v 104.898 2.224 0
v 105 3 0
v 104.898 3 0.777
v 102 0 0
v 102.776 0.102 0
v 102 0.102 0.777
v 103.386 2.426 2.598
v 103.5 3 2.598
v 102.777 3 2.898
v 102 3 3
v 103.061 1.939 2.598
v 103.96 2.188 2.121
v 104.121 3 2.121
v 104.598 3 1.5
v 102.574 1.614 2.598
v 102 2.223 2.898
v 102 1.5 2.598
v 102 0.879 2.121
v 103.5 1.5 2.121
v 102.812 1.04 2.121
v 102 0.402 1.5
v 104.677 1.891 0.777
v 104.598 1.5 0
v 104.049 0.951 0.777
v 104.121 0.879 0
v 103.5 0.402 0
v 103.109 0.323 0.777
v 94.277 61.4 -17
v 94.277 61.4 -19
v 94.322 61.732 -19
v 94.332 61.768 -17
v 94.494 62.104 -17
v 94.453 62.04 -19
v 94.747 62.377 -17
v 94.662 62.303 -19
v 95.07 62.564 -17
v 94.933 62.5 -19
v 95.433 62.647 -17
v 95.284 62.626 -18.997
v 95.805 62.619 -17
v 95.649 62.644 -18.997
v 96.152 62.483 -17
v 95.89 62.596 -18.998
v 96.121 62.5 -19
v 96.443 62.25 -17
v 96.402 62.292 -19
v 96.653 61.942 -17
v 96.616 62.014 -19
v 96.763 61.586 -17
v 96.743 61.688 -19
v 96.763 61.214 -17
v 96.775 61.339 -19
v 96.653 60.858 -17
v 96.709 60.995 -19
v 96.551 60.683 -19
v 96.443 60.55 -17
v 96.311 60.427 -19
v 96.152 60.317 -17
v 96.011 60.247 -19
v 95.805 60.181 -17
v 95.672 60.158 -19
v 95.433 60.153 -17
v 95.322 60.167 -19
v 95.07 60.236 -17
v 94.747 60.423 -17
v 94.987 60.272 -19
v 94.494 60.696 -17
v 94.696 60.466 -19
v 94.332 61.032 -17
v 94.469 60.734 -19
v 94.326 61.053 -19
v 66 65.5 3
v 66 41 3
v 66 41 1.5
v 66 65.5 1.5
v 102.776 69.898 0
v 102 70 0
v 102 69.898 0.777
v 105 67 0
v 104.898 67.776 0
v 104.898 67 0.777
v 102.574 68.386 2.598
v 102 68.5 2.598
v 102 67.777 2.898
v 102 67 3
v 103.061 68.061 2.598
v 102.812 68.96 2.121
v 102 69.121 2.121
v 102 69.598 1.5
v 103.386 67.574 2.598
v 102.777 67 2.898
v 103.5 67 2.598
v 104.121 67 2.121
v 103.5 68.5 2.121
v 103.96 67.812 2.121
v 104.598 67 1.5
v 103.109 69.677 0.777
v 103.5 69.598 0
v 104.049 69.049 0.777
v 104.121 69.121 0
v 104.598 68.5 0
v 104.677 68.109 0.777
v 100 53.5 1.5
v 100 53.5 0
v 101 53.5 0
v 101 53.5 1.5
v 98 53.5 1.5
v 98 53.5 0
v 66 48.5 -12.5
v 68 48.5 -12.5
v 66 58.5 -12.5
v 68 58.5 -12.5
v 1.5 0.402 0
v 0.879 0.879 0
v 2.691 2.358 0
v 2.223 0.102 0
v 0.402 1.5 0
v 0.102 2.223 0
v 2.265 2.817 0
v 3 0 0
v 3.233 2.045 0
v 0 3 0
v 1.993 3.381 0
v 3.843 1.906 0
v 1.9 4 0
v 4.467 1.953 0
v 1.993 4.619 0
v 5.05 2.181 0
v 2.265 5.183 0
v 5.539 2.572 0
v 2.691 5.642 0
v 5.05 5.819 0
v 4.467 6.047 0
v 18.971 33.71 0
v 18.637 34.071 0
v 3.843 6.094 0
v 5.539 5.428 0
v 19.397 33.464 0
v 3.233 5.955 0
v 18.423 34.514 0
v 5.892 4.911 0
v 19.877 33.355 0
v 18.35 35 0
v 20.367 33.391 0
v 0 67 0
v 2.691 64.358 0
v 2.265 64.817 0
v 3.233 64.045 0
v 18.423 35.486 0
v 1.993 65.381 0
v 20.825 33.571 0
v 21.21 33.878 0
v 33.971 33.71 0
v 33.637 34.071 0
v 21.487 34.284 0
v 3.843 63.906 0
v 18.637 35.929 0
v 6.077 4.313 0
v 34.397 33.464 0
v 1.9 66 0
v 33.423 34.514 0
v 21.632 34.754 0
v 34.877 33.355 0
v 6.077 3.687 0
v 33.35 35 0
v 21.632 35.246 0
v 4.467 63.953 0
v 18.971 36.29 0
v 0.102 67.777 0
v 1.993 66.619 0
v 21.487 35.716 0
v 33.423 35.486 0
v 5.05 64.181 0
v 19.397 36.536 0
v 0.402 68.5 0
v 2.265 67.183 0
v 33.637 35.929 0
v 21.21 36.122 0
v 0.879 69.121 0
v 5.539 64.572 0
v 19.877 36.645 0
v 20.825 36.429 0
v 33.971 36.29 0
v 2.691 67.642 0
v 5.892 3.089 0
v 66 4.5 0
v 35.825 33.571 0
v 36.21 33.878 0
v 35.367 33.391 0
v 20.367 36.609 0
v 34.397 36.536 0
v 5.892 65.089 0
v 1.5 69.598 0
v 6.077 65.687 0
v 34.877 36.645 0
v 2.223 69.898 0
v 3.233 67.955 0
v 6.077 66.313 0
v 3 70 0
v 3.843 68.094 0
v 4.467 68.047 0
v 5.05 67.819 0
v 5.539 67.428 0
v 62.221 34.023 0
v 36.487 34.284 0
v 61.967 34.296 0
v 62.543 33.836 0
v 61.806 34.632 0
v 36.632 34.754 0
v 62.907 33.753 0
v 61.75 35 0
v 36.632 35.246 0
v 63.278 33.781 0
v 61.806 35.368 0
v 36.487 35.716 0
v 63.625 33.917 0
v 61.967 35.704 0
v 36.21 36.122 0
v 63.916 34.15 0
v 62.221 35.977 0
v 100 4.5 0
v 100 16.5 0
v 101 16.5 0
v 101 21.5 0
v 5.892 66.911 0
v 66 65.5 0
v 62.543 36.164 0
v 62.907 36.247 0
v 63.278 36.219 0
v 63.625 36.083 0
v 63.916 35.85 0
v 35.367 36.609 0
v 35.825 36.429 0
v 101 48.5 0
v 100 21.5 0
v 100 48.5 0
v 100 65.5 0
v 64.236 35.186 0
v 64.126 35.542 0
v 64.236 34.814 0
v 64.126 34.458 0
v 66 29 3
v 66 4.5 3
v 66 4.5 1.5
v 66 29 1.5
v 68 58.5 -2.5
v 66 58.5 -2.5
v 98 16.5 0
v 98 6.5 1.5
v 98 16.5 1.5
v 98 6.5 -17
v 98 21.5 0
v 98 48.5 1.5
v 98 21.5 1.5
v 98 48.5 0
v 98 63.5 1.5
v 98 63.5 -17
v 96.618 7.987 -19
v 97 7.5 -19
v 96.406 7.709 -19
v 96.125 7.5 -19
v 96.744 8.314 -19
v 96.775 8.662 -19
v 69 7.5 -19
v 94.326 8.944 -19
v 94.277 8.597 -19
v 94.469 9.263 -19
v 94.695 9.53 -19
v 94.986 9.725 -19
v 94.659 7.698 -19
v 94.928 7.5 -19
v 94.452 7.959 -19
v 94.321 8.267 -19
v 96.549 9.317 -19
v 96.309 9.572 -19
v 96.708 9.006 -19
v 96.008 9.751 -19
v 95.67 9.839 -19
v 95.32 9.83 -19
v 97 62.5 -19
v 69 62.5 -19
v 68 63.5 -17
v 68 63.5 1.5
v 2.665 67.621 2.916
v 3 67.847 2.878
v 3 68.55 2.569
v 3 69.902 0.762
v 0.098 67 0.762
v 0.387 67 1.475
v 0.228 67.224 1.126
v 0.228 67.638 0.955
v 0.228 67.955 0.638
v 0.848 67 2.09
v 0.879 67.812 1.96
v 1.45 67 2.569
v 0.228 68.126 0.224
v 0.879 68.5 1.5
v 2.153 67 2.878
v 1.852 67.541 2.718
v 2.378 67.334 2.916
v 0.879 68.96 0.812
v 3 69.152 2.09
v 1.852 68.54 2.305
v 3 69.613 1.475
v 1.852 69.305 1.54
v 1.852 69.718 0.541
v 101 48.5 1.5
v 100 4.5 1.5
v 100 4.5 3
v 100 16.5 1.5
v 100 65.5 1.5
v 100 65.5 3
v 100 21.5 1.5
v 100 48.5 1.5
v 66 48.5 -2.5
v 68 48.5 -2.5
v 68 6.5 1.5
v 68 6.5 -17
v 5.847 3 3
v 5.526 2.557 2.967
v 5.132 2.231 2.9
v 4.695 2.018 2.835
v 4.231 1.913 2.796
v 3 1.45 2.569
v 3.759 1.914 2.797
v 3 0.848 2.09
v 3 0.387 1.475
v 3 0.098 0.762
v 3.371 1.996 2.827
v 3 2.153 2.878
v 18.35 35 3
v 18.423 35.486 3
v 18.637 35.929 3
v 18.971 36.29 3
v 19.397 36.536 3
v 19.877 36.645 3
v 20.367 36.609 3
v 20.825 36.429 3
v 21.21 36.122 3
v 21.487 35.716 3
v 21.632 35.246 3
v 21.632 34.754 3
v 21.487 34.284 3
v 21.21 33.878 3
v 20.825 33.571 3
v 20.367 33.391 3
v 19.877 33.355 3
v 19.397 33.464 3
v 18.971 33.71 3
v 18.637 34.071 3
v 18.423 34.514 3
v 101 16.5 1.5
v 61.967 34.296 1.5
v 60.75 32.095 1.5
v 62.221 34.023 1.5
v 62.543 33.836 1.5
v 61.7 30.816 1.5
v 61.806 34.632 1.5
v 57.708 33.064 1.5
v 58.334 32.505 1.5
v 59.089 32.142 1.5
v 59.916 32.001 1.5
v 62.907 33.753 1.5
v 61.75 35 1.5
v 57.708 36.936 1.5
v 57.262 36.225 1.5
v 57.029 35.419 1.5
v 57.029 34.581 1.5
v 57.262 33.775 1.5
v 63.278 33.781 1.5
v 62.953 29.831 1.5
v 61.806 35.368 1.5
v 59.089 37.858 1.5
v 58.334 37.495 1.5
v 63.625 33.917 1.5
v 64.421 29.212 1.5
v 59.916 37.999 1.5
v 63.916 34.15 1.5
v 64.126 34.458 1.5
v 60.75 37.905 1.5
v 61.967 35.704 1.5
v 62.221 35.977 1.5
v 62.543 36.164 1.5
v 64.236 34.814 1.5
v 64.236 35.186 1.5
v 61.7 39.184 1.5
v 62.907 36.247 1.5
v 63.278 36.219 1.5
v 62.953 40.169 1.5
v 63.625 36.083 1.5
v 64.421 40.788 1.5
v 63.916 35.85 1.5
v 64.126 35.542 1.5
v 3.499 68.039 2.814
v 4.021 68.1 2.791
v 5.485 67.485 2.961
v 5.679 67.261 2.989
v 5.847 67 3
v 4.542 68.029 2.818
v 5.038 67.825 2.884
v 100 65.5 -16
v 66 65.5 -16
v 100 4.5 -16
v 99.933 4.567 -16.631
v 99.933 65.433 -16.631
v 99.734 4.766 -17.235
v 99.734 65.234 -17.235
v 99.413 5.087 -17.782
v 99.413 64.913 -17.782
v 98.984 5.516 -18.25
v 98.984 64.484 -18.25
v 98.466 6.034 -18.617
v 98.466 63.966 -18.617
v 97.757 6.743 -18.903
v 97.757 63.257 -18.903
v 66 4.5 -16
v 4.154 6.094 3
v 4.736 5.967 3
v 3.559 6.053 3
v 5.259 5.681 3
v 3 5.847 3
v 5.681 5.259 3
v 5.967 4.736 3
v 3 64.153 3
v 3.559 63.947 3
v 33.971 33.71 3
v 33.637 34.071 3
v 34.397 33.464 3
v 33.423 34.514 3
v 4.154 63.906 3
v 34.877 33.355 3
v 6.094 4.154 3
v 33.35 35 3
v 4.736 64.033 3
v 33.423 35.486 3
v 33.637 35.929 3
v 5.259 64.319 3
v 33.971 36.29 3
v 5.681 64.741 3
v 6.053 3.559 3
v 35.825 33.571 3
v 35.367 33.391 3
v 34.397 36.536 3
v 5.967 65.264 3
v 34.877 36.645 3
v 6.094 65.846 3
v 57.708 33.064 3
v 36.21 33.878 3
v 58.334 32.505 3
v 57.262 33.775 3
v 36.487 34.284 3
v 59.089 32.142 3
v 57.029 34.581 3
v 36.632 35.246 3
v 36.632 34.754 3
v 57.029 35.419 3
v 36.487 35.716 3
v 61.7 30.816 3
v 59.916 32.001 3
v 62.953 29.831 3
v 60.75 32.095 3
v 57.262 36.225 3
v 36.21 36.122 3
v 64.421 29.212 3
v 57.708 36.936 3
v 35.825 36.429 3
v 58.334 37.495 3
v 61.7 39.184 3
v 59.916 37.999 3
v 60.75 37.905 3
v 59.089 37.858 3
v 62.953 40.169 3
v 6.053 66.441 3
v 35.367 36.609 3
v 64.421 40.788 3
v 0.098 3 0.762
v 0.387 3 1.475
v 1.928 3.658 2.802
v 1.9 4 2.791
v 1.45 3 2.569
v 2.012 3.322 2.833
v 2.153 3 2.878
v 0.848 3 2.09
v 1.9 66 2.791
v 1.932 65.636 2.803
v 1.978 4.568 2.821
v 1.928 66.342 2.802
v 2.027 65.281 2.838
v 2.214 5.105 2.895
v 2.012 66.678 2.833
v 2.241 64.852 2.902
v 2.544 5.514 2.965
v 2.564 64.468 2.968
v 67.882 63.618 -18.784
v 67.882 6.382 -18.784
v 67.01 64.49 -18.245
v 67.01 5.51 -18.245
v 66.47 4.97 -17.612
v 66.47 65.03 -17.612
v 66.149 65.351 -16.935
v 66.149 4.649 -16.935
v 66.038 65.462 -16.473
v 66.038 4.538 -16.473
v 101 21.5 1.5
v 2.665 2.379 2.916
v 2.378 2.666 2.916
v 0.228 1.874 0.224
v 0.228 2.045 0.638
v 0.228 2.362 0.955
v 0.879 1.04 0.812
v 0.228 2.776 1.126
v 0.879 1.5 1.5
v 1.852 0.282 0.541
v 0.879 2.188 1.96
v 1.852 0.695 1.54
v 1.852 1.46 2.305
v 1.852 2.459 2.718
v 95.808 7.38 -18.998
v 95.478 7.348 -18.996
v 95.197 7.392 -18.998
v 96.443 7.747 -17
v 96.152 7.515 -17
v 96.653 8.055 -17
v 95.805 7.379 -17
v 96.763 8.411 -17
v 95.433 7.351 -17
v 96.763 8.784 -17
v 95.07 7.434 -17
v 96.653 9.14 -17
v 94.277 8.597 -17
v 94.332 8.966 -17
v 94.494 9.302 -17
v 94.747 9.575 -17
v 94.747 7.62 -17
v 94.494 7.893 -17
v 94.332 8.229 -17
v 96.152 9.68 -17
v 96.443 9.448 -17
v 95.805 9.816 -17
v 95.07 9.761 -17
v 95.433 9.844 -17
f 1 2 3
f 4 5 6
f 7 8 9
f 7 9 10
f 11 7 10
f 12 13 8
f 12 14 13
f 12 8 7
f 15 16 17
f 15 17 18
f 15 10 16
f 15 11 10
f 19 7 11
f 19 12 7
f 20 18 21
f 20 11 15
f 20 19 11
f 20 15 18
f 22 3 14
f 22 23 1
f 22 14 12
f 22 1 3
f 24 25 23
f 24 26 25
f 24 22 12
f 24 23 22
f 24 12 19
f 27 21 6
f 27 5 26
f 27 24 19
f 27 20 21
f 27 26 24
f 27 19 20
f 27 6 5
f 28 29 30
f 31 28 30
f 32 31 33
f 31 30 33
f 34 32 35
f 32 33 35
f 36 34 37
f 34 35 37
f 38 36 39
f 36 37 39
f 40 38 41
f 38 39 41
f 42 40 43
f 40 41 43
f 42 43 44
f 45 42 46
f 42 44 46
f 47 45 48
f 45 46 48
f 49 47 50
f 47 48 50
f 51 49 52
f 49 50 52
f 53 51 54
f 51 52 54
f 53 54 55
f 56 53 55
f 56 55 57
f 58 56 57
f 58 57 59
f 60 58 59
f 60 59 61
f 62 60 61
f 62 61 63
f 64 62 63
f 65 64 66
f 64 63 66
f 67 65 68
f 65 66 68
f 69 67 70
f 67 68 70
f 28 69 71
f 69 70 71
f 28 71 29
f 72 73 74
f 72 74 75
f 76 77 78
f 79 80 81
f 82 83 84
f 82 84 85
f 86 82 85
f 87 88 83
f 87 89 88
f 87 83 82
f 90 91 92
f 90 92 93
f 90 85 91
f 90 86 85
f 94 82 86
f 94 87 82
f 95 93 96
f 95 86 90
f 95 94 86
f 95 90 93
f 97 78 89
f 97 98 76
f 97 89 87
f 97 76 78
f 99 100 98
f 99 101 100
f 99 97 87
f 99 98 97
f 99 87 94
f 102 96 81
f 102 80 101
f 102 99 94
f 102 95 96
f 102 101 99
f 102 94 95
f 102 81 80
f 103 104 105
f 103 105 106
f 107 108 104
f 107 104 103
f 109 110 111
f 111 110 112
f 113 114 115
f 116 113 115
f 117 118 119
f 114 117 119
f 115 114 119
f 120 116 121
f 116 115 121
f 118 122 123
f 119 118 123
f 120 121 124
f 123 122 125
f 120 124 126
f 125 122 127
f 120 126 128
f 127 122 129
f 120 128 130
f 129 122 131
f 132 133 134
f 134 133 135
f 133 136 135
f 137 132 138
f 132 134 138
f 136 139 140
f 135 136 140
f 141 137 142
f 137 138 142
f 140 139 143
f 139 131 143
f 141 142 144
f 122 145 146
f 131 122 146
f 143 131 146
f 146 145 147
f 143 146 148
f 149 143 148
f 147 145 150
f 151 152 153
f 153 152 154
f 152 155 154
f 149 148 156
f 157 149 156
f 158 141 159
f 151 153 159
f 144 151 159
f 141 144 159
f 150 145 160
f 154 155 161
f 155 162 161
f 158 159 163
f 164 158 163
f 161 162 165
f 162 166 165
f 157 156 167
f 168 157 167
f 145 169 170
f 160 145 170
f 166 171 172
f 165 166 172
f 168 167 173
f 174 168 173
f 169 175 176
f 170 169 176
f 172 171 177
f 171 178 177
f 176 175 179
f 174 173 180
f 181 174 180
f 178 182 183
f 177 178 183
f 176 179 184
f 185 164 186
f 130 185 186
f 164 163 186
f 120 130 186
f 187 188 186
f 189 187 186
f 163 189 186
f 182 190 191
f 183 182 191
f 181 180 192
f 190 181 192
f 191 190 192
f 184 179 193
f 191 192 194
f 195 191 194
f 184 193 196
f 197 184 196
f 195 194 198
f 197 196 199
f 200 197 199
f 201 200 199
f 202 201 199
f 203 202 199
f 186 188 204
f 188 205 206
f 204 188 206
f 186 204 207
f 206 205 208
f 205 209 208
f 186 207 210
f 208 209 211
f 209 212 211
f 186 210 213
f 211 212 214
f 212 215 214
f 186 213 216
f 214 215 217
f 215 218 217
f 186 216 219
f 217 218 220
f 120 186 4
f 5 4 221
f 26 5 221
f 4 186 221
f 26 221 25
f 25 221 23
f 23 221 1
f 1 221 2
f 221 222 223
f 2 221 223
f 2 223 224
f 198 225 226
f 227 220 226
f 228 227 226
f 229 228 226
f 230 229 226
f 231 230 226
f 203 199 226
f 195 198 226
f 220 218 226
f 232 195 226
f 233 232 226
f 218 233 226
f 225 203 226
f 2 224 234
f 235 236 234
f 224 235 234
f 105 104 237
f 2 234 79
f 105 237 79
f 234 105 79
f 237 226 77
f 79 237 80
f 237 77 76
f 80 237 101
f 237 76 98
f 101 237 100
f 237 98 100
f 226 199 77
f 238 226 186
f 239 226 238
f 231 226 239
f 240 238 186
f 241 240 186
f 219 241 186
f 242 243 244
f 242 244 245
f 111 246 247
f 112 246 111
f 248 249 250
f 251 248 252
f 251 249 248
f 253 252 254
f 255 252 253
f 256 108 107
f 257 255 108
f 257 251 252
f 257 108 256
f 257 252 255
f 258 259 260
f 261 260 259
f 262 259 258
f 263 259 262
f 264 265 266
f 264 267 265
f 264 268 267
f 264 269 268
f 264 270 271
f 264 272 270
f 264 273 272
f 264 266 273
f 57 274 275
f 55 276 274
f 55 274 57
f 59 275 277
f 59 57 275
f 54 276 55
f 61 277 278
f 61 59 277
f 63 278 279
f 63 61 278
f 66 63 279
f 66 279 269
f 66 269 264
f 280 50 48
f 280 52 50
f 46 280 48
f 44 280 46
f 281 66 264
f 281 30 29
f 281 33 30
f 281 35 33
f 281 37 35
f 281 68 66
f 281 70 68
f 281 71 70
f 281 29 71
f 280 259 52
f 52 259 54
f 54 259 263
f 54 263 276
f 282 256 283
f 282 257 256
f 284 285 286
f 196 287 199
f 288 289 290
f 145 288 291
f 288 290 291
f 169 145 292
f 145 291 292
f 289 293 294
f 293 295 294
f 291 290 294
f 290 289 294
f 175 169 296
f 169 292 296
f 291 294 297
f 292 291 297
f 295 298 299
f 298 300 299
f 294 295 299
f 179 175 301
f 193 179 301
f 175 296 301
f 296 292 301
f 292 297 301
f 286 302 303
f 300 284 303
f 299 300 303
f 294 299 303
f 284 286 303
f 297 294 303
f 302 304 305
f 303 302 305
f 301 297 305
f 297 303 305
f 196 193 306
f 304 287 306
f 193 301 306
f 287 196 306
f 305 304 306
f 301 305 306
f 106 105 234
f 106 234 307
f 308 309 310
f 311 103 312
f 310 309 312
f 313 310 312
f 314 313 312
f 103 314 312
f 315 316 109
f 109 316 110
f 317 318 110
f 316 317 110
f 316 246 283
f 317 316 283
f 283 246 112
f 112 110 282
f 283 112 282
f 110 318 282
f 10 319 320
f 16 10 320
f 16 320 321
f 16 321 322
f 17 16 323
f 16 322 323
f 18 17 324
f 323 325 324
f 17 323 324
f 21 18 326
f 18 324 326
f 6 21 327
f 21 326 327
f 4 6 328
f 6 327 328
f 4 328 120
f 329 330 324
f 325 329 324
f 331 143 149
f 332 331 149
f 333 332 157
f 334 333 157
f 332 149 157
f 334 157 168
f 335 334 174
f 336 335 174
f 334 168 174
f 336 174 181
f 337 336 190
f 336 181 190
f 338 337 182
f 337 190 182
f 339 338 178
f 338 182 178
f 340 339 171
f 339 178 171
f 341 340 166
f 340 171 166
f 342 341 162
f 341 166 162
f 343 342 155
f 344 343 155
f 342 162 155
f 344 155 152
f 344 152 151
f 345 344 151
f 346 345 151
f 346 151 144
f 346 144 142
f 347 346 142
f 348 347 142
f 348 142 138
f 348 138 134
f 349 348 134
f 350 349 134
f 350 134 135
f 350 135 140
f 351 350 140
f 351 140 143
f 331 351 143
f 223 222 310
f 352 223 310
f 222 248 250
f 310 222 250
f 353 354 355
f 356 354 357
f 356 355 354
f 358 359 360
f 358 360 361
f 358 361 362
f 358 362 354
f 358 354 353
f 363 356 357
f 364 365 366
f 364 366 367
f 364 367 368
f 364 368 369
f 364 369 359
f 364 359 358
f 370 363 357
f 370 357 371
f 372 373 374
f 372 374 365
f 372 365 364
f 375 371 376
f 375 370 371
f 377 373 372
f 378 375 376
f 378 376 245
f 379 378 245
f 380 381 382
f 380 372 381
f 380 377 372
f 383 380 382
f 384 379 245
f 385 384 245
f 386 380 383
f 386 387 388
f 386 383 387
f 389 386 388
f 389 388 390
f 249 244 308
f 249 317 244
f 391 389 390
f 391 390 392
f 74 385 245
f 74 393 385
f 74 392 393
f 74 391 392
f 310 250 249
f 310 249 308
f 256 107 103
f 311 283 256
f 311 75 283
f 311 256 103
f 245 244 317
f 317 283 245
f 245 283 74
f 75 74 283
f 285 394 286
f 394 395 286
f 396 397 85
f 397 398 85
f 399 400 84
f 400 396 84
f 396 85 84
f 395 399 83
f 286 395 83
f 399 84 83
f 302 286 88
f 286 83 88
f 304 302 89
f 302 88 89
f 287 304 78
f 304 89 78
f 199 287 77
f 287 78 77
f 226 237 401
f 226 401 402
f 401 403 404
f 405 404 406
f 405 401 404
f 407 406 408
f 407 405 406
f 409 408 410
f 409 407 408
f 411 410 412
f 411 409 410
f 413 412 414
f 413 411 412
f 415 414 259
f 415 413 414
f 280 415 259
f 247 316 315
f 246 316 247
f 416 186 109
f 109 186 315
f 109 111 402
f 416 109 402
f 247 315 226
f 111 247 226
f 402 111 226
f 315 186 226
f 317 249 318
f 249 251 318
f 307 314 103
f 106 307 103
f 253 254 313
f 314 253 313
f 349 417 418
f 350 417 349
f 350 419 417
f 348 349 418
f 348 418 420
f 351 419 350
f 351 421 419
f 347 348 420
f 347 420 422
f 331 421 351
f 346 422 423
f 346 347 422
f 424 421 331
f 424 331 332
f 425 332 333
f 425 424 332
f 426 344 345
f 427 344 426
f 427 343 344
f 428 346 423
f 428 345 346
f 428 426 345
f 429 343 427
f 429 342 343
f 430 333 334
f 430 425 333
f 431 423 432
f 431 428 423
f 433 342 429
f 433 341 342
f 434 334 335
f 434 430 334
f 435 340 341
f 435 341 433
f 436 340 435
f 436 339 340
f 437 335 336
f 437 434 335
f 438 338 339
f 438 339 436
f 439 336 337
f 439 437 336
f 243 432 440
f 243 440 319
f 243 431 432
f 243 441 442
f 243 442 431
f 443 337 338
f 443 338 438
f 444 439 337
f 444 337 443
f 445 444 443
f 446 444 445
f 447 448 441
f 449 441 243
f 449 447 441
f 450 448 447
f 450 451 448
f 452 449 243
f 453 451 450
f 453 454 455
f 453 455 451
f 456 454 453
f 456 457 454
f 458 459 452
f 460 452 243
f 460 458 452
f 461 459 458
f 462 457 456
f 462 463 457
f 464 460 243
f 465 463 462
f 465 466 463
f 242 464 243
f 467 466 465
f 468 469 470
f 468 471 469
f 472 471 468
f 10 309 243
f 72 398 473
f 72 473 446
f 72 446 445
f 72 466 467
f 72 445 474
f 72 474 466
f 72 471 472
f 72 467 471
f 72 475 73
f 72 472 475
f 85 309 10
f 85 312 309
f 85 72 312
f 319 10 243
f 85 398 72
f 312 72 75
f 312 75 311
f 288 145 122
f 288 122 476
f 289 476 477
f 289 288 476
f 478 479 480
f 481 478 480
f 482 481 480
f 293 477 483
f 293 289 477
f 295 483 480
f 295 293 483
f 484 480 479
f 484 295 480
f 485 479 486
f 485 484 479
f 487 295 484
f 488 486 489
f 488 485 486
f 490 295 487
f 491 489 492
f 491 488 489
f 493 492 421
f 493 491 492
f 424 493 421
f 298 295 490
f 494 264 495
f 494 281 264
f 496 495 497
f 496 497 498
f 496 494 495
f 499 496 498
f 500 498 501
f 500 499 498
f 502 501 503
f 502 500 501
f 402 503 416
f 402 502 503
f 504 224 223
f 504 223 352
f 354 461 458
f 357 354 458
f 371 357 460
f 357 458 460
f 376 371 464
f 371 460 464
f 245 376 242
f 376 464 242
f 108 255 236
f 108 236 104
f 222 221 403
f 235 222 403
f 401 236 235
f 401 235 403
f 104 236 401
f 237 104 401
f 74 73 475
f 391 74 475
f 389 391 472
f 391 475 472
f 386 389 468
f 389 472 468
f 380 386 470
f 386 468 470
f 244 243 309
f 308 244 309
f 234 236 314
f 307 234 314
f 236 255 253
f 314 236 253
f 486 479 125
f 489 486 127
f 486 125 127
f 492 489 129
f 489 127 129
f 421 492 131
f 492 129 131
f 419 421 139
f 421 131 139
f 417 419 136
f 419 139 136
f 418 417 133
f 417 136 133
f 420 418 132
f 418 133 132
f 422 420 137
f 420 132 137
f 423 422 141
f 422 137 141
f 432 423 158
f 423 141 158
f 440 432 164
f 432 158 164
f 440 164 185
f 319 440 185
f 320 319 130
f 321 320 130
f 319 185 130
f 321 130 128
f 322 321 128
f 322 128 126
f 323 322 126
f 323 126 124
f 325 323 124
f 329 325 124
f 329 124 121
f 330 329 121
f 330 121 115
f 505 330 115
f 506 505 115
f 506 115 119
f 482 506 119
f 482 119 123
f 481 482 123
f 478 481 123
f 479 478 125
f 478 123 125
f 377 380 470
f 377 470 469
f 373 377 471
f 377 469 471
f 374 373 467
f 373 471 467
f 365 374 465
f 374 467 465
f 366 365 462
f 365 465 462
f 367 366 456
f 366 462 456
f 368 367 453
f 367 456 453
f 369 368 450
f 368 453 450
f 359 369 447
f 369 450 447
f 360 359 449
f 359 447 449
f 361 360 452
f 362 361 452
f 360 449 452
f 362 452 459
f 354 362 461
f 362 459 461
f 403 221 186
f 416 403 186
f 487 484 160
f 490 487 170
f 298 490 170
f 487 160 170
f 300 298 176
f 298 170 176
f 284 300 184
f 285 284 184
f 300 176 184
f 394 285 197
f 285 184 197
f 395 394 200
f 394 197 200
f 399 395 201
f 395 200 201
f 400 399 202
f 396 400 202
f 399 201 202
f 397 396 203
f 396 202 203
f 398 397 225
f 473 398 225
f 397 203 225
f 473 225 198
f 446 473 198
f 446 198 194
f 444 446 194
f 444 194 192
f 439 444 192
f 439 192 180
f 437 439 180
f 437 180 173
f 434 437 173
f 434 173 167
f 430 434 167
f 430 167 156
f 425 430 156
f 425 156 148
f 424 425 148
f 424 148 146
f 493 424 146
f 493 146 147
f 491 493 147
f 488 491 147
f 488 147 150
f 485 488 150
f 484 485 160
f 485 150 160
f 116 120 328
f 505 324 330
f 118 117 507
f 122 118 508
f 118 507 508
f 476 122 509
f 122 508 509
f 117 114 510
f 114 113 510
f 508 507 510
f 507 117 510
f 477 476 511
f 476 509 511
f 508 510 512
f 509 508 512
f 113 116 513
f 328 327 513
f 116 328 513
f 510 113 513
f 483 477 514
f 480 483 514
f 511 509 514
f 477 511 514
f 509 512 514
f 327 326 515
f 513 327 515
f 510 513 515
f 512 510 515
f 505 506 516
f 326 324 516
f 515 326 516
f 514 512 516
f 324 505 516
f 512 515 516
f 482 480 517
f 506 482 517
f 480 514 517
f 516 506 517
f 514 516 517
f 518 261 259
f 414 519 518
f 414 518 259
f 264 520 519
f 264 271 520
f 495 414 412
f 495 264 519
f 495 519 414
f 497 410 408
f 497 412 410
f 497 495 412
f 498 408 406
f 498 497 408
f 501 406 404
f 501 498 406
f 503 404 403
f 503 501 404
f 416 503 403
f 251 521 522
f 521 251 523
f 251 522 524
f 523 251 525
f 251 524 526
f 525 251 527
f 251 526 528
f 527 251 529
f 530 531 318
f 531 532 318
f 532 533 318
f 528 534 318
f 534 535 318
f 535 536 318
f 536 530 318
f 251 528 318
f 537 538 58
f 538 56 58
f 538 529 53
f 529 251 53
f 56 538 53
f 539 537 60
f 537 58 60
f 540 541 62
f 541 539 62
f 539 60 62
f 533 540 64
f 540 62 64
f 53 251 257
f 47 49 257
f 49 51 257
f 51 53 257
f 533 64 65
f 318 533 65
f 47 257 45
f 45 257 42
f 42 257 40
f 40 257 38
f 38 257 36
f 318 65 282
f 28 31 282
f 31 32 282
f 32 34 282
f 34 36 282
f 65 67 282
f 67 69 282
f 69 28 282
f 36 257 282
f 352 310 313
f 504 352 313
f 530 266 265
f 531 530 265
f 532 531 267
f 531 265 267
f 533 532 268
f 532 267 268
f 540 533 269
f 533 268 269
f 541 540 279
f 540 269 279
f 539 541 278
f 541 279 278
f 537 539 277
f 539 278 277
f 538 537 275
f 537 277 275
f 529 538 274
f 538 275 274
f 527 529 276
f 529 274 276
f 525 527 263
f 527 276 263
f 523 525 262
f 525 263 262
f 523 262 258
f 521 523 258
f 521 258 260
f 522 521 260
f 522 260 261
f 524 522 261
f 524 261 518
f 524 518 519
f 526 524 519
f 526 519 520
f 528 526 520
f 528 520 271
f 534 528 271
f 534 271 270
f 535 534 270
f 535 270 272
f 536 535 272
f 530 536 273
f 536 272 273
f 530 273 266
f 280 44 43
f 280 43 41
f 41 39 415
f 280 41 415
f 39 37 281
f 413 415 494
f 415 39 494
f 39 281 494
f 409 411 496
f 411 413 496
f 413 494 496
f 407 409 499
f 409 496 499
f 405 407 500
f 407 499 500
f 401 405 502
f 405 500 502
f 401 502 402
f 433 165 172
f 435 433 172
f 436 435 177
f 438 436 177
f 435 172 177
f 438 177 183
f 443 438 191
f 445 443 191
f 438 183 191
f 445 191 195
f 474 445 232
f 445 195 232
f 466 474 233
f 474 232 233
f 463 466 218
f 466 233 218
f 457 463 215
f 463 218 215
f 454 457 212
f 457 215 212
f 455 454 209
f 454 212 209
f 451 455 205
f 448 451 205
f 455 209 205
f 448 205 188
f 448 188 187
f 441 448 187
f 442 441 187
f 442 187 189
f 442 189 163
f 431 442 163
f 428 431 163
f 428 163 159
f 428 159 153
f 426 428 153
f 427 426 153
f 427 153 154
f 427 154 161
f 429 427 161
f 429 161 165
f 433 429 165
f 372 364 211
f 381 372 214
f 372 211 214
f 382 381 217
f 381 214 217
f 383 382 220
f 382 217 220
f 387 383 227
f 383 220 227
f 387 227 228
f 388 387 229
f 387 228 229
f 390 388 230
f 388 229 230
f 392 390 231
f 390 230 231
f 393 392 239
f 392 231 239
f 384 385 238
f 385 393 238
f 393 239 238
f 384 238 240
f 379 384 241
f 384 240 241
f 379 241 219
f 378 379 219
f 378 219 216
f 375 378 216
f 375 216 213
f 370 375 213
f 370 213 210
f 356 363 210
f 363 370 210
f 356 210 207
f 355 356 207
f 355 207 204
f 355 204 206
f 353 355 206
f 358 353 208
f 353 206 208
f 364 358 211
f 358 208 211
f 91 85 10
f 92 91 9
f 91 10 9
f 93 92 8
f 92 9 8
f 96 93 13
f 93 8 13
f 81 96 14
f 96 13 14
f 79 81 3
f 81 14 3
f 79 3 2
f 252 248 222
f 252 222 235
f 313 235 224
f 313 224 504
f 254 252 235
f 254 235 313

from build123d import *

# Parameters (mm, degrees)
SKETCH1_W                   = 105
SKETCH1_H                   = 70
BOSS_EXTRUDE1_DEPTH         = 3
FILLET4_R                   = 3
FILLET5_R                   = 3
FILLET6_R                   = 3
M5X0_8_TAPPED_HOLE2_D       = 4.2
SKETCH16_6_W                = 34
SKETCH16_6_H                = 61
SKETCH16_6_W_2              = 30
SKETCH16_6_H_2              = 57
BOSS_EXTRUDE3_DEPTH         = 20
CUT_EXTRUDE8_REACH          = 129.334
SKETCH21_W                  = 30
SKETCH21_H                  = 57
SKETCH20_W                  = 34
SKETCH20_H                  = 61
BOSS_EXTRUDE4_DEPTH         = 2
SKETCH22_W                  = 34
SKETCH22_H                  = 61
CUT_EXTRUDE9_DEPTH          = 1.5
FILLET8_R                   = 3
SKETCH26_R                  = 6
CUT_EXTRUDE10_DEPTH         = 1.5
M3_TAPPED_HOLE1_D           = 2.5
M3_TAPPED_HOLE1_DEPTH       = 7.5
M3_TAPPED_HOLE1_TIP         = 0.751075774
SKETCH33_W                  = 1.5
SKETCH33_H                  = 5
CUT_EXTRUDE11_DEPTH         = 3
M3_TAPPED_HOLE2_D           = 2.5
M3_TAPPED_HOLE2_DEPTH       = 7.5
M3_TAPPED_HOLE2_TIP         = 0.751075774
M3_TAPPED_HOLE3_D           = 2.5
M3_TAPPED_HOLE3_DEPTH       = 7.5
M3_TAPPED_HOLE3_TIP         = 0.751075774
CUT_EXTRUDE12_REACH         = 101.423
SKETCH37_W                  = 10
SKETCH37_H                  = 10
SKETCH39_R                  = 3
CUT_EXTRUDE13_DEPTH         = 1.5
TAP_DRILL_FOR_M4X0_7_TAP2_D = 3.3


with BuildPart() as part:
    # Sketch1 → Boss-Extrude1 (new body)
    with BuildSketch(Plane.XY):
        with Locations((52.5, 35)):
            Rectangle(SKETCH1_W, SKETCH1_H)
    extrude(amount=BOSS_EXTRUDE1_DEPTH)

    # Fillet4
    fillet4_edges = [part.edges().sort_by_distance(p)[0] for p in [
        (105, 0, 1.5),
        (105, 70, 1.5),
    ]]
    fillet(fillet4_edges, radius=FILLET4_R)

    # Fillet5
    fillet5_edges = [part.edges().sort_by_distance(p)[0] for p in [
        (51, 70, 3),
        (105, 35, 3),
        (51, 0, 3),
        (104.121320344, 69.121320344, 3),
        (104.121320344, 0.878679656, 3),
    ]]
    fillet(fillet5_edges, radius=FILLET5_R - 0.0001)  # a hair under: the kernel refuses the full size

    # Fillet6
    fillet6_edges = [part.edges().sort_by_distance(p)[0] for p in [
        (0, 35, 3),
        (0, 0.878650367, 2.121349633),
        (0, 69.121349633, 2.121349633),
    ]]
    fillet(fillet6_edges, radius=FILLET6_R - 0.0001)  # a hair under: the kernel refuses the full size

    # M5x0.8 Tapped Hole2 (through all)
    with Locations(Plane(origin=(4, 66, 3), x_dir=(1, 0, 0), z_dir=(0, 0, 1))):
        with Locations((0, 0), (0, -62)):
            Hole(M5X0_8_TAPPED_HOLE2_D / 2)

    # Sketch16<6> → Boss-Extrude3 (add)
    with BuildSketch(Plane.XY.offset(3)):
        with Locations((83, 35)):
            Rectangle(SKETCH16_6_W, SKETCH16_6_H)
        with Locations((83, 35)):
            Rectangle(SKETCH16_6_W_2, SKETCH16_6_H_2, mode=Mode.SUBTRACT)
    extrude(amount=-BOSS_EXTRUDE3_DEPTH)

    # Sketch21 → Cut-Extrude8 (cut, up to next)
    with BuildSketch(Plane(origin=(0, 0, 0), x_dir=(-1, 0, 0), z_dir=(0, 0, -1)), mode=Mode.PRIVATE) as cut_extrude8_sk1:
        with Locations((-83, 35)):
            Rectangle(SKETCH21_W, SKETCH21_H)
    cut_extrude8_tool1 = extrude(cut_extrude8_sk1.sketch, amount=-CUT_EXTRUDE8_REACH, mode=Mode.PRIVATE) & part.part
    add(cut_extrude8_tool1.solids().sort_by_distance((83, 35, 0))[0], mode=Mode.SUBTRACT)

    # Sketch20 → Boss-Extrude4 (add)
    with BuildSketch(Plane(origin=(0, 0, -17), x_dir=(-1, 0, 0), z_dir=(0, 0, -1))):
        with Locations((-83, 35)):
            Rectangle(SKETCH20_W, SKETCH20_H)
    extrude(amount=BOSS_EXTRUDE4_DEPTH)

    # Sketch22 → Cut-Extrude9 (cut)
    with BuildSketch(Plane.XY.offset(3)):
        with Locations((83, 35)):
            Rectangle(SKETCH22_W, SKETCH22_H)
    extrude(amount=-CUT_EXTRUDE9_DEPTH, mode=Mode.SUBTRACT)

    # Fillet8
    fillet8_edges = [part.edges().sort_by_distance(p)[0] for p in [
        (100, 35, -19),
        (83, 4.5, -19),
        (66, 35, -19),
        (83, 65.5, -19),
    ]]
    fillet(fillet8_edges, radius=FILLET8_R)

    # Sketch26 → Cut-Extrude10 (cut)
    with BuildSketch(Plane.XY.offset(3)):
        with Locations((66, 35)):
            Circle(SKETCH26_R)
    extrude(amount=-CUT_EXTRUDE10_DEPTH, mode=Mode.SUBTRACT)

    # M3 Tapped Hole1
    with Locations(Plane(origin=(63, 35, 1.5), x_dir=(1, 0, 0), z_dir=(0, 0, 1))):
        with Locations((0, 0)):
            Hole(M3_TAPPED_HOLE1_D / 2, depth=M3_TAPPED_HOLE1_DEPTH)
            with Locations((0, 0, -(M3_TAPPED_HOLE1_DEPTH + M3_TAPPED_HOLE1_TIP / 2))):  # 118° drill point
                Cone(0, M3_TAPPED_HOLE1_D / 2, M3_TAPPED_HOLE1_TIP, mode=Mode.SUBTRACT)

    # Sketch33 → Cut-Extrude11 (cut)
    with BuildSketch(Plane.ZY.offset(-98)):
        with Locations((0.75, 51)):
            Rectangle(SKETCH33_W, SKETCH33_H)
        with Locations((0.75, 19)):
            Rectangle(SKETCH33_W, SKETCH33_H)
    extrude(amount=-CUT_EXTRUDE11_DEPTH, mode=Mode.SUBTRACT)

    # M3 Tapped Hole2
    with Locations(Plane(origin=(95.52684029, 8.597468083, -17), x_dir=(1, 0, 0), z_dir=(0, 0, 1))):
        with Locations((0, 0)):
            Hole(M3_TAPPED_HOLE2_D / 2, depth=M3_TAPPED_HOLE2_DEPTH)
            with Locations((0, 0, -(M3_TAPPED_HOLE2_DEPTH + M3_TAPPED_HOLE2_TIP / 2))):  # 118° drill point
                Cone(0, M3_TAPPED_HOLE2_D / 2, M3_TAPPED_HOLE2_TIP, mode=Mode.SUBTRACT)

    # M3 Tapped Hole3
    with Locations(Plane(origin=(95.52684029, 61.4, -17), x_dir=(1, 0, 0), z_dir=(0, 0, 1))):
        with Locations((0, 0)):
            Hole(M3_TAPPED_HOLE3_D / 2, depth=M3_TAPPED_HOLE3_DEPTH)
            with Locations((0, 0, -(M3_TAPPED_HOLE3_DEPTH + M3_TAPPED_HOLE3_TIP / 2))):  # 118° drill point
                Cone(0, M3_TAPPED_HOLE3_D / 2, M3_TAPPED_HOLE3_TIP, mode=Mode.SUBTRACT)

    # Sketch37 → Cut-Extrude12 (cut, up to next)
    with BuildSketch(Plane(origin=(68, 0, 0), x_dir=(0, 0, -1), z_dir=(1, 0, 0)), mode=Mode.PRIVATE) as cut_extrude12_sk1:
        with Locations((7.5, 53.5)):
            Rectangle(SKETCH37_W, SKETCH37_H)
    cut_extrude12_tool1 = extrude(cut_extrude12_sk1.sketch, amount=-CUT_EXTRUDE12_REACH, mode=Mode.PRIVATE) & part.part
    add(cut_extrude12_tool1.solids().sort_by_distance((68, 53.5, -7.5))[0], mode=Mode.SUBTRACT)

    # Sketch39 → Cut-Extrude13 (cut)
    with BuildSketch(Plane.XY.offset(3)):
        with Locations((60, 35)):
            Circle(SKETCH39_R)
    extrude(amount=-CUT_EXTRUDE13_DEPTH, mode=Mode.SUBTRACT)

    # Tap Drill for M4x0.7 Tap2 (through all)
    with Locations(Plane(origin=(20, 35, 3), x_dir=(1, 0, 0), z_dir=(0, 0, 1))):
        with Locations((0, 0), (15, 0)):
            Hole(TAP_DRILL_FOR_M4X0_7_TAP2_D / 2)


solid = part.part
